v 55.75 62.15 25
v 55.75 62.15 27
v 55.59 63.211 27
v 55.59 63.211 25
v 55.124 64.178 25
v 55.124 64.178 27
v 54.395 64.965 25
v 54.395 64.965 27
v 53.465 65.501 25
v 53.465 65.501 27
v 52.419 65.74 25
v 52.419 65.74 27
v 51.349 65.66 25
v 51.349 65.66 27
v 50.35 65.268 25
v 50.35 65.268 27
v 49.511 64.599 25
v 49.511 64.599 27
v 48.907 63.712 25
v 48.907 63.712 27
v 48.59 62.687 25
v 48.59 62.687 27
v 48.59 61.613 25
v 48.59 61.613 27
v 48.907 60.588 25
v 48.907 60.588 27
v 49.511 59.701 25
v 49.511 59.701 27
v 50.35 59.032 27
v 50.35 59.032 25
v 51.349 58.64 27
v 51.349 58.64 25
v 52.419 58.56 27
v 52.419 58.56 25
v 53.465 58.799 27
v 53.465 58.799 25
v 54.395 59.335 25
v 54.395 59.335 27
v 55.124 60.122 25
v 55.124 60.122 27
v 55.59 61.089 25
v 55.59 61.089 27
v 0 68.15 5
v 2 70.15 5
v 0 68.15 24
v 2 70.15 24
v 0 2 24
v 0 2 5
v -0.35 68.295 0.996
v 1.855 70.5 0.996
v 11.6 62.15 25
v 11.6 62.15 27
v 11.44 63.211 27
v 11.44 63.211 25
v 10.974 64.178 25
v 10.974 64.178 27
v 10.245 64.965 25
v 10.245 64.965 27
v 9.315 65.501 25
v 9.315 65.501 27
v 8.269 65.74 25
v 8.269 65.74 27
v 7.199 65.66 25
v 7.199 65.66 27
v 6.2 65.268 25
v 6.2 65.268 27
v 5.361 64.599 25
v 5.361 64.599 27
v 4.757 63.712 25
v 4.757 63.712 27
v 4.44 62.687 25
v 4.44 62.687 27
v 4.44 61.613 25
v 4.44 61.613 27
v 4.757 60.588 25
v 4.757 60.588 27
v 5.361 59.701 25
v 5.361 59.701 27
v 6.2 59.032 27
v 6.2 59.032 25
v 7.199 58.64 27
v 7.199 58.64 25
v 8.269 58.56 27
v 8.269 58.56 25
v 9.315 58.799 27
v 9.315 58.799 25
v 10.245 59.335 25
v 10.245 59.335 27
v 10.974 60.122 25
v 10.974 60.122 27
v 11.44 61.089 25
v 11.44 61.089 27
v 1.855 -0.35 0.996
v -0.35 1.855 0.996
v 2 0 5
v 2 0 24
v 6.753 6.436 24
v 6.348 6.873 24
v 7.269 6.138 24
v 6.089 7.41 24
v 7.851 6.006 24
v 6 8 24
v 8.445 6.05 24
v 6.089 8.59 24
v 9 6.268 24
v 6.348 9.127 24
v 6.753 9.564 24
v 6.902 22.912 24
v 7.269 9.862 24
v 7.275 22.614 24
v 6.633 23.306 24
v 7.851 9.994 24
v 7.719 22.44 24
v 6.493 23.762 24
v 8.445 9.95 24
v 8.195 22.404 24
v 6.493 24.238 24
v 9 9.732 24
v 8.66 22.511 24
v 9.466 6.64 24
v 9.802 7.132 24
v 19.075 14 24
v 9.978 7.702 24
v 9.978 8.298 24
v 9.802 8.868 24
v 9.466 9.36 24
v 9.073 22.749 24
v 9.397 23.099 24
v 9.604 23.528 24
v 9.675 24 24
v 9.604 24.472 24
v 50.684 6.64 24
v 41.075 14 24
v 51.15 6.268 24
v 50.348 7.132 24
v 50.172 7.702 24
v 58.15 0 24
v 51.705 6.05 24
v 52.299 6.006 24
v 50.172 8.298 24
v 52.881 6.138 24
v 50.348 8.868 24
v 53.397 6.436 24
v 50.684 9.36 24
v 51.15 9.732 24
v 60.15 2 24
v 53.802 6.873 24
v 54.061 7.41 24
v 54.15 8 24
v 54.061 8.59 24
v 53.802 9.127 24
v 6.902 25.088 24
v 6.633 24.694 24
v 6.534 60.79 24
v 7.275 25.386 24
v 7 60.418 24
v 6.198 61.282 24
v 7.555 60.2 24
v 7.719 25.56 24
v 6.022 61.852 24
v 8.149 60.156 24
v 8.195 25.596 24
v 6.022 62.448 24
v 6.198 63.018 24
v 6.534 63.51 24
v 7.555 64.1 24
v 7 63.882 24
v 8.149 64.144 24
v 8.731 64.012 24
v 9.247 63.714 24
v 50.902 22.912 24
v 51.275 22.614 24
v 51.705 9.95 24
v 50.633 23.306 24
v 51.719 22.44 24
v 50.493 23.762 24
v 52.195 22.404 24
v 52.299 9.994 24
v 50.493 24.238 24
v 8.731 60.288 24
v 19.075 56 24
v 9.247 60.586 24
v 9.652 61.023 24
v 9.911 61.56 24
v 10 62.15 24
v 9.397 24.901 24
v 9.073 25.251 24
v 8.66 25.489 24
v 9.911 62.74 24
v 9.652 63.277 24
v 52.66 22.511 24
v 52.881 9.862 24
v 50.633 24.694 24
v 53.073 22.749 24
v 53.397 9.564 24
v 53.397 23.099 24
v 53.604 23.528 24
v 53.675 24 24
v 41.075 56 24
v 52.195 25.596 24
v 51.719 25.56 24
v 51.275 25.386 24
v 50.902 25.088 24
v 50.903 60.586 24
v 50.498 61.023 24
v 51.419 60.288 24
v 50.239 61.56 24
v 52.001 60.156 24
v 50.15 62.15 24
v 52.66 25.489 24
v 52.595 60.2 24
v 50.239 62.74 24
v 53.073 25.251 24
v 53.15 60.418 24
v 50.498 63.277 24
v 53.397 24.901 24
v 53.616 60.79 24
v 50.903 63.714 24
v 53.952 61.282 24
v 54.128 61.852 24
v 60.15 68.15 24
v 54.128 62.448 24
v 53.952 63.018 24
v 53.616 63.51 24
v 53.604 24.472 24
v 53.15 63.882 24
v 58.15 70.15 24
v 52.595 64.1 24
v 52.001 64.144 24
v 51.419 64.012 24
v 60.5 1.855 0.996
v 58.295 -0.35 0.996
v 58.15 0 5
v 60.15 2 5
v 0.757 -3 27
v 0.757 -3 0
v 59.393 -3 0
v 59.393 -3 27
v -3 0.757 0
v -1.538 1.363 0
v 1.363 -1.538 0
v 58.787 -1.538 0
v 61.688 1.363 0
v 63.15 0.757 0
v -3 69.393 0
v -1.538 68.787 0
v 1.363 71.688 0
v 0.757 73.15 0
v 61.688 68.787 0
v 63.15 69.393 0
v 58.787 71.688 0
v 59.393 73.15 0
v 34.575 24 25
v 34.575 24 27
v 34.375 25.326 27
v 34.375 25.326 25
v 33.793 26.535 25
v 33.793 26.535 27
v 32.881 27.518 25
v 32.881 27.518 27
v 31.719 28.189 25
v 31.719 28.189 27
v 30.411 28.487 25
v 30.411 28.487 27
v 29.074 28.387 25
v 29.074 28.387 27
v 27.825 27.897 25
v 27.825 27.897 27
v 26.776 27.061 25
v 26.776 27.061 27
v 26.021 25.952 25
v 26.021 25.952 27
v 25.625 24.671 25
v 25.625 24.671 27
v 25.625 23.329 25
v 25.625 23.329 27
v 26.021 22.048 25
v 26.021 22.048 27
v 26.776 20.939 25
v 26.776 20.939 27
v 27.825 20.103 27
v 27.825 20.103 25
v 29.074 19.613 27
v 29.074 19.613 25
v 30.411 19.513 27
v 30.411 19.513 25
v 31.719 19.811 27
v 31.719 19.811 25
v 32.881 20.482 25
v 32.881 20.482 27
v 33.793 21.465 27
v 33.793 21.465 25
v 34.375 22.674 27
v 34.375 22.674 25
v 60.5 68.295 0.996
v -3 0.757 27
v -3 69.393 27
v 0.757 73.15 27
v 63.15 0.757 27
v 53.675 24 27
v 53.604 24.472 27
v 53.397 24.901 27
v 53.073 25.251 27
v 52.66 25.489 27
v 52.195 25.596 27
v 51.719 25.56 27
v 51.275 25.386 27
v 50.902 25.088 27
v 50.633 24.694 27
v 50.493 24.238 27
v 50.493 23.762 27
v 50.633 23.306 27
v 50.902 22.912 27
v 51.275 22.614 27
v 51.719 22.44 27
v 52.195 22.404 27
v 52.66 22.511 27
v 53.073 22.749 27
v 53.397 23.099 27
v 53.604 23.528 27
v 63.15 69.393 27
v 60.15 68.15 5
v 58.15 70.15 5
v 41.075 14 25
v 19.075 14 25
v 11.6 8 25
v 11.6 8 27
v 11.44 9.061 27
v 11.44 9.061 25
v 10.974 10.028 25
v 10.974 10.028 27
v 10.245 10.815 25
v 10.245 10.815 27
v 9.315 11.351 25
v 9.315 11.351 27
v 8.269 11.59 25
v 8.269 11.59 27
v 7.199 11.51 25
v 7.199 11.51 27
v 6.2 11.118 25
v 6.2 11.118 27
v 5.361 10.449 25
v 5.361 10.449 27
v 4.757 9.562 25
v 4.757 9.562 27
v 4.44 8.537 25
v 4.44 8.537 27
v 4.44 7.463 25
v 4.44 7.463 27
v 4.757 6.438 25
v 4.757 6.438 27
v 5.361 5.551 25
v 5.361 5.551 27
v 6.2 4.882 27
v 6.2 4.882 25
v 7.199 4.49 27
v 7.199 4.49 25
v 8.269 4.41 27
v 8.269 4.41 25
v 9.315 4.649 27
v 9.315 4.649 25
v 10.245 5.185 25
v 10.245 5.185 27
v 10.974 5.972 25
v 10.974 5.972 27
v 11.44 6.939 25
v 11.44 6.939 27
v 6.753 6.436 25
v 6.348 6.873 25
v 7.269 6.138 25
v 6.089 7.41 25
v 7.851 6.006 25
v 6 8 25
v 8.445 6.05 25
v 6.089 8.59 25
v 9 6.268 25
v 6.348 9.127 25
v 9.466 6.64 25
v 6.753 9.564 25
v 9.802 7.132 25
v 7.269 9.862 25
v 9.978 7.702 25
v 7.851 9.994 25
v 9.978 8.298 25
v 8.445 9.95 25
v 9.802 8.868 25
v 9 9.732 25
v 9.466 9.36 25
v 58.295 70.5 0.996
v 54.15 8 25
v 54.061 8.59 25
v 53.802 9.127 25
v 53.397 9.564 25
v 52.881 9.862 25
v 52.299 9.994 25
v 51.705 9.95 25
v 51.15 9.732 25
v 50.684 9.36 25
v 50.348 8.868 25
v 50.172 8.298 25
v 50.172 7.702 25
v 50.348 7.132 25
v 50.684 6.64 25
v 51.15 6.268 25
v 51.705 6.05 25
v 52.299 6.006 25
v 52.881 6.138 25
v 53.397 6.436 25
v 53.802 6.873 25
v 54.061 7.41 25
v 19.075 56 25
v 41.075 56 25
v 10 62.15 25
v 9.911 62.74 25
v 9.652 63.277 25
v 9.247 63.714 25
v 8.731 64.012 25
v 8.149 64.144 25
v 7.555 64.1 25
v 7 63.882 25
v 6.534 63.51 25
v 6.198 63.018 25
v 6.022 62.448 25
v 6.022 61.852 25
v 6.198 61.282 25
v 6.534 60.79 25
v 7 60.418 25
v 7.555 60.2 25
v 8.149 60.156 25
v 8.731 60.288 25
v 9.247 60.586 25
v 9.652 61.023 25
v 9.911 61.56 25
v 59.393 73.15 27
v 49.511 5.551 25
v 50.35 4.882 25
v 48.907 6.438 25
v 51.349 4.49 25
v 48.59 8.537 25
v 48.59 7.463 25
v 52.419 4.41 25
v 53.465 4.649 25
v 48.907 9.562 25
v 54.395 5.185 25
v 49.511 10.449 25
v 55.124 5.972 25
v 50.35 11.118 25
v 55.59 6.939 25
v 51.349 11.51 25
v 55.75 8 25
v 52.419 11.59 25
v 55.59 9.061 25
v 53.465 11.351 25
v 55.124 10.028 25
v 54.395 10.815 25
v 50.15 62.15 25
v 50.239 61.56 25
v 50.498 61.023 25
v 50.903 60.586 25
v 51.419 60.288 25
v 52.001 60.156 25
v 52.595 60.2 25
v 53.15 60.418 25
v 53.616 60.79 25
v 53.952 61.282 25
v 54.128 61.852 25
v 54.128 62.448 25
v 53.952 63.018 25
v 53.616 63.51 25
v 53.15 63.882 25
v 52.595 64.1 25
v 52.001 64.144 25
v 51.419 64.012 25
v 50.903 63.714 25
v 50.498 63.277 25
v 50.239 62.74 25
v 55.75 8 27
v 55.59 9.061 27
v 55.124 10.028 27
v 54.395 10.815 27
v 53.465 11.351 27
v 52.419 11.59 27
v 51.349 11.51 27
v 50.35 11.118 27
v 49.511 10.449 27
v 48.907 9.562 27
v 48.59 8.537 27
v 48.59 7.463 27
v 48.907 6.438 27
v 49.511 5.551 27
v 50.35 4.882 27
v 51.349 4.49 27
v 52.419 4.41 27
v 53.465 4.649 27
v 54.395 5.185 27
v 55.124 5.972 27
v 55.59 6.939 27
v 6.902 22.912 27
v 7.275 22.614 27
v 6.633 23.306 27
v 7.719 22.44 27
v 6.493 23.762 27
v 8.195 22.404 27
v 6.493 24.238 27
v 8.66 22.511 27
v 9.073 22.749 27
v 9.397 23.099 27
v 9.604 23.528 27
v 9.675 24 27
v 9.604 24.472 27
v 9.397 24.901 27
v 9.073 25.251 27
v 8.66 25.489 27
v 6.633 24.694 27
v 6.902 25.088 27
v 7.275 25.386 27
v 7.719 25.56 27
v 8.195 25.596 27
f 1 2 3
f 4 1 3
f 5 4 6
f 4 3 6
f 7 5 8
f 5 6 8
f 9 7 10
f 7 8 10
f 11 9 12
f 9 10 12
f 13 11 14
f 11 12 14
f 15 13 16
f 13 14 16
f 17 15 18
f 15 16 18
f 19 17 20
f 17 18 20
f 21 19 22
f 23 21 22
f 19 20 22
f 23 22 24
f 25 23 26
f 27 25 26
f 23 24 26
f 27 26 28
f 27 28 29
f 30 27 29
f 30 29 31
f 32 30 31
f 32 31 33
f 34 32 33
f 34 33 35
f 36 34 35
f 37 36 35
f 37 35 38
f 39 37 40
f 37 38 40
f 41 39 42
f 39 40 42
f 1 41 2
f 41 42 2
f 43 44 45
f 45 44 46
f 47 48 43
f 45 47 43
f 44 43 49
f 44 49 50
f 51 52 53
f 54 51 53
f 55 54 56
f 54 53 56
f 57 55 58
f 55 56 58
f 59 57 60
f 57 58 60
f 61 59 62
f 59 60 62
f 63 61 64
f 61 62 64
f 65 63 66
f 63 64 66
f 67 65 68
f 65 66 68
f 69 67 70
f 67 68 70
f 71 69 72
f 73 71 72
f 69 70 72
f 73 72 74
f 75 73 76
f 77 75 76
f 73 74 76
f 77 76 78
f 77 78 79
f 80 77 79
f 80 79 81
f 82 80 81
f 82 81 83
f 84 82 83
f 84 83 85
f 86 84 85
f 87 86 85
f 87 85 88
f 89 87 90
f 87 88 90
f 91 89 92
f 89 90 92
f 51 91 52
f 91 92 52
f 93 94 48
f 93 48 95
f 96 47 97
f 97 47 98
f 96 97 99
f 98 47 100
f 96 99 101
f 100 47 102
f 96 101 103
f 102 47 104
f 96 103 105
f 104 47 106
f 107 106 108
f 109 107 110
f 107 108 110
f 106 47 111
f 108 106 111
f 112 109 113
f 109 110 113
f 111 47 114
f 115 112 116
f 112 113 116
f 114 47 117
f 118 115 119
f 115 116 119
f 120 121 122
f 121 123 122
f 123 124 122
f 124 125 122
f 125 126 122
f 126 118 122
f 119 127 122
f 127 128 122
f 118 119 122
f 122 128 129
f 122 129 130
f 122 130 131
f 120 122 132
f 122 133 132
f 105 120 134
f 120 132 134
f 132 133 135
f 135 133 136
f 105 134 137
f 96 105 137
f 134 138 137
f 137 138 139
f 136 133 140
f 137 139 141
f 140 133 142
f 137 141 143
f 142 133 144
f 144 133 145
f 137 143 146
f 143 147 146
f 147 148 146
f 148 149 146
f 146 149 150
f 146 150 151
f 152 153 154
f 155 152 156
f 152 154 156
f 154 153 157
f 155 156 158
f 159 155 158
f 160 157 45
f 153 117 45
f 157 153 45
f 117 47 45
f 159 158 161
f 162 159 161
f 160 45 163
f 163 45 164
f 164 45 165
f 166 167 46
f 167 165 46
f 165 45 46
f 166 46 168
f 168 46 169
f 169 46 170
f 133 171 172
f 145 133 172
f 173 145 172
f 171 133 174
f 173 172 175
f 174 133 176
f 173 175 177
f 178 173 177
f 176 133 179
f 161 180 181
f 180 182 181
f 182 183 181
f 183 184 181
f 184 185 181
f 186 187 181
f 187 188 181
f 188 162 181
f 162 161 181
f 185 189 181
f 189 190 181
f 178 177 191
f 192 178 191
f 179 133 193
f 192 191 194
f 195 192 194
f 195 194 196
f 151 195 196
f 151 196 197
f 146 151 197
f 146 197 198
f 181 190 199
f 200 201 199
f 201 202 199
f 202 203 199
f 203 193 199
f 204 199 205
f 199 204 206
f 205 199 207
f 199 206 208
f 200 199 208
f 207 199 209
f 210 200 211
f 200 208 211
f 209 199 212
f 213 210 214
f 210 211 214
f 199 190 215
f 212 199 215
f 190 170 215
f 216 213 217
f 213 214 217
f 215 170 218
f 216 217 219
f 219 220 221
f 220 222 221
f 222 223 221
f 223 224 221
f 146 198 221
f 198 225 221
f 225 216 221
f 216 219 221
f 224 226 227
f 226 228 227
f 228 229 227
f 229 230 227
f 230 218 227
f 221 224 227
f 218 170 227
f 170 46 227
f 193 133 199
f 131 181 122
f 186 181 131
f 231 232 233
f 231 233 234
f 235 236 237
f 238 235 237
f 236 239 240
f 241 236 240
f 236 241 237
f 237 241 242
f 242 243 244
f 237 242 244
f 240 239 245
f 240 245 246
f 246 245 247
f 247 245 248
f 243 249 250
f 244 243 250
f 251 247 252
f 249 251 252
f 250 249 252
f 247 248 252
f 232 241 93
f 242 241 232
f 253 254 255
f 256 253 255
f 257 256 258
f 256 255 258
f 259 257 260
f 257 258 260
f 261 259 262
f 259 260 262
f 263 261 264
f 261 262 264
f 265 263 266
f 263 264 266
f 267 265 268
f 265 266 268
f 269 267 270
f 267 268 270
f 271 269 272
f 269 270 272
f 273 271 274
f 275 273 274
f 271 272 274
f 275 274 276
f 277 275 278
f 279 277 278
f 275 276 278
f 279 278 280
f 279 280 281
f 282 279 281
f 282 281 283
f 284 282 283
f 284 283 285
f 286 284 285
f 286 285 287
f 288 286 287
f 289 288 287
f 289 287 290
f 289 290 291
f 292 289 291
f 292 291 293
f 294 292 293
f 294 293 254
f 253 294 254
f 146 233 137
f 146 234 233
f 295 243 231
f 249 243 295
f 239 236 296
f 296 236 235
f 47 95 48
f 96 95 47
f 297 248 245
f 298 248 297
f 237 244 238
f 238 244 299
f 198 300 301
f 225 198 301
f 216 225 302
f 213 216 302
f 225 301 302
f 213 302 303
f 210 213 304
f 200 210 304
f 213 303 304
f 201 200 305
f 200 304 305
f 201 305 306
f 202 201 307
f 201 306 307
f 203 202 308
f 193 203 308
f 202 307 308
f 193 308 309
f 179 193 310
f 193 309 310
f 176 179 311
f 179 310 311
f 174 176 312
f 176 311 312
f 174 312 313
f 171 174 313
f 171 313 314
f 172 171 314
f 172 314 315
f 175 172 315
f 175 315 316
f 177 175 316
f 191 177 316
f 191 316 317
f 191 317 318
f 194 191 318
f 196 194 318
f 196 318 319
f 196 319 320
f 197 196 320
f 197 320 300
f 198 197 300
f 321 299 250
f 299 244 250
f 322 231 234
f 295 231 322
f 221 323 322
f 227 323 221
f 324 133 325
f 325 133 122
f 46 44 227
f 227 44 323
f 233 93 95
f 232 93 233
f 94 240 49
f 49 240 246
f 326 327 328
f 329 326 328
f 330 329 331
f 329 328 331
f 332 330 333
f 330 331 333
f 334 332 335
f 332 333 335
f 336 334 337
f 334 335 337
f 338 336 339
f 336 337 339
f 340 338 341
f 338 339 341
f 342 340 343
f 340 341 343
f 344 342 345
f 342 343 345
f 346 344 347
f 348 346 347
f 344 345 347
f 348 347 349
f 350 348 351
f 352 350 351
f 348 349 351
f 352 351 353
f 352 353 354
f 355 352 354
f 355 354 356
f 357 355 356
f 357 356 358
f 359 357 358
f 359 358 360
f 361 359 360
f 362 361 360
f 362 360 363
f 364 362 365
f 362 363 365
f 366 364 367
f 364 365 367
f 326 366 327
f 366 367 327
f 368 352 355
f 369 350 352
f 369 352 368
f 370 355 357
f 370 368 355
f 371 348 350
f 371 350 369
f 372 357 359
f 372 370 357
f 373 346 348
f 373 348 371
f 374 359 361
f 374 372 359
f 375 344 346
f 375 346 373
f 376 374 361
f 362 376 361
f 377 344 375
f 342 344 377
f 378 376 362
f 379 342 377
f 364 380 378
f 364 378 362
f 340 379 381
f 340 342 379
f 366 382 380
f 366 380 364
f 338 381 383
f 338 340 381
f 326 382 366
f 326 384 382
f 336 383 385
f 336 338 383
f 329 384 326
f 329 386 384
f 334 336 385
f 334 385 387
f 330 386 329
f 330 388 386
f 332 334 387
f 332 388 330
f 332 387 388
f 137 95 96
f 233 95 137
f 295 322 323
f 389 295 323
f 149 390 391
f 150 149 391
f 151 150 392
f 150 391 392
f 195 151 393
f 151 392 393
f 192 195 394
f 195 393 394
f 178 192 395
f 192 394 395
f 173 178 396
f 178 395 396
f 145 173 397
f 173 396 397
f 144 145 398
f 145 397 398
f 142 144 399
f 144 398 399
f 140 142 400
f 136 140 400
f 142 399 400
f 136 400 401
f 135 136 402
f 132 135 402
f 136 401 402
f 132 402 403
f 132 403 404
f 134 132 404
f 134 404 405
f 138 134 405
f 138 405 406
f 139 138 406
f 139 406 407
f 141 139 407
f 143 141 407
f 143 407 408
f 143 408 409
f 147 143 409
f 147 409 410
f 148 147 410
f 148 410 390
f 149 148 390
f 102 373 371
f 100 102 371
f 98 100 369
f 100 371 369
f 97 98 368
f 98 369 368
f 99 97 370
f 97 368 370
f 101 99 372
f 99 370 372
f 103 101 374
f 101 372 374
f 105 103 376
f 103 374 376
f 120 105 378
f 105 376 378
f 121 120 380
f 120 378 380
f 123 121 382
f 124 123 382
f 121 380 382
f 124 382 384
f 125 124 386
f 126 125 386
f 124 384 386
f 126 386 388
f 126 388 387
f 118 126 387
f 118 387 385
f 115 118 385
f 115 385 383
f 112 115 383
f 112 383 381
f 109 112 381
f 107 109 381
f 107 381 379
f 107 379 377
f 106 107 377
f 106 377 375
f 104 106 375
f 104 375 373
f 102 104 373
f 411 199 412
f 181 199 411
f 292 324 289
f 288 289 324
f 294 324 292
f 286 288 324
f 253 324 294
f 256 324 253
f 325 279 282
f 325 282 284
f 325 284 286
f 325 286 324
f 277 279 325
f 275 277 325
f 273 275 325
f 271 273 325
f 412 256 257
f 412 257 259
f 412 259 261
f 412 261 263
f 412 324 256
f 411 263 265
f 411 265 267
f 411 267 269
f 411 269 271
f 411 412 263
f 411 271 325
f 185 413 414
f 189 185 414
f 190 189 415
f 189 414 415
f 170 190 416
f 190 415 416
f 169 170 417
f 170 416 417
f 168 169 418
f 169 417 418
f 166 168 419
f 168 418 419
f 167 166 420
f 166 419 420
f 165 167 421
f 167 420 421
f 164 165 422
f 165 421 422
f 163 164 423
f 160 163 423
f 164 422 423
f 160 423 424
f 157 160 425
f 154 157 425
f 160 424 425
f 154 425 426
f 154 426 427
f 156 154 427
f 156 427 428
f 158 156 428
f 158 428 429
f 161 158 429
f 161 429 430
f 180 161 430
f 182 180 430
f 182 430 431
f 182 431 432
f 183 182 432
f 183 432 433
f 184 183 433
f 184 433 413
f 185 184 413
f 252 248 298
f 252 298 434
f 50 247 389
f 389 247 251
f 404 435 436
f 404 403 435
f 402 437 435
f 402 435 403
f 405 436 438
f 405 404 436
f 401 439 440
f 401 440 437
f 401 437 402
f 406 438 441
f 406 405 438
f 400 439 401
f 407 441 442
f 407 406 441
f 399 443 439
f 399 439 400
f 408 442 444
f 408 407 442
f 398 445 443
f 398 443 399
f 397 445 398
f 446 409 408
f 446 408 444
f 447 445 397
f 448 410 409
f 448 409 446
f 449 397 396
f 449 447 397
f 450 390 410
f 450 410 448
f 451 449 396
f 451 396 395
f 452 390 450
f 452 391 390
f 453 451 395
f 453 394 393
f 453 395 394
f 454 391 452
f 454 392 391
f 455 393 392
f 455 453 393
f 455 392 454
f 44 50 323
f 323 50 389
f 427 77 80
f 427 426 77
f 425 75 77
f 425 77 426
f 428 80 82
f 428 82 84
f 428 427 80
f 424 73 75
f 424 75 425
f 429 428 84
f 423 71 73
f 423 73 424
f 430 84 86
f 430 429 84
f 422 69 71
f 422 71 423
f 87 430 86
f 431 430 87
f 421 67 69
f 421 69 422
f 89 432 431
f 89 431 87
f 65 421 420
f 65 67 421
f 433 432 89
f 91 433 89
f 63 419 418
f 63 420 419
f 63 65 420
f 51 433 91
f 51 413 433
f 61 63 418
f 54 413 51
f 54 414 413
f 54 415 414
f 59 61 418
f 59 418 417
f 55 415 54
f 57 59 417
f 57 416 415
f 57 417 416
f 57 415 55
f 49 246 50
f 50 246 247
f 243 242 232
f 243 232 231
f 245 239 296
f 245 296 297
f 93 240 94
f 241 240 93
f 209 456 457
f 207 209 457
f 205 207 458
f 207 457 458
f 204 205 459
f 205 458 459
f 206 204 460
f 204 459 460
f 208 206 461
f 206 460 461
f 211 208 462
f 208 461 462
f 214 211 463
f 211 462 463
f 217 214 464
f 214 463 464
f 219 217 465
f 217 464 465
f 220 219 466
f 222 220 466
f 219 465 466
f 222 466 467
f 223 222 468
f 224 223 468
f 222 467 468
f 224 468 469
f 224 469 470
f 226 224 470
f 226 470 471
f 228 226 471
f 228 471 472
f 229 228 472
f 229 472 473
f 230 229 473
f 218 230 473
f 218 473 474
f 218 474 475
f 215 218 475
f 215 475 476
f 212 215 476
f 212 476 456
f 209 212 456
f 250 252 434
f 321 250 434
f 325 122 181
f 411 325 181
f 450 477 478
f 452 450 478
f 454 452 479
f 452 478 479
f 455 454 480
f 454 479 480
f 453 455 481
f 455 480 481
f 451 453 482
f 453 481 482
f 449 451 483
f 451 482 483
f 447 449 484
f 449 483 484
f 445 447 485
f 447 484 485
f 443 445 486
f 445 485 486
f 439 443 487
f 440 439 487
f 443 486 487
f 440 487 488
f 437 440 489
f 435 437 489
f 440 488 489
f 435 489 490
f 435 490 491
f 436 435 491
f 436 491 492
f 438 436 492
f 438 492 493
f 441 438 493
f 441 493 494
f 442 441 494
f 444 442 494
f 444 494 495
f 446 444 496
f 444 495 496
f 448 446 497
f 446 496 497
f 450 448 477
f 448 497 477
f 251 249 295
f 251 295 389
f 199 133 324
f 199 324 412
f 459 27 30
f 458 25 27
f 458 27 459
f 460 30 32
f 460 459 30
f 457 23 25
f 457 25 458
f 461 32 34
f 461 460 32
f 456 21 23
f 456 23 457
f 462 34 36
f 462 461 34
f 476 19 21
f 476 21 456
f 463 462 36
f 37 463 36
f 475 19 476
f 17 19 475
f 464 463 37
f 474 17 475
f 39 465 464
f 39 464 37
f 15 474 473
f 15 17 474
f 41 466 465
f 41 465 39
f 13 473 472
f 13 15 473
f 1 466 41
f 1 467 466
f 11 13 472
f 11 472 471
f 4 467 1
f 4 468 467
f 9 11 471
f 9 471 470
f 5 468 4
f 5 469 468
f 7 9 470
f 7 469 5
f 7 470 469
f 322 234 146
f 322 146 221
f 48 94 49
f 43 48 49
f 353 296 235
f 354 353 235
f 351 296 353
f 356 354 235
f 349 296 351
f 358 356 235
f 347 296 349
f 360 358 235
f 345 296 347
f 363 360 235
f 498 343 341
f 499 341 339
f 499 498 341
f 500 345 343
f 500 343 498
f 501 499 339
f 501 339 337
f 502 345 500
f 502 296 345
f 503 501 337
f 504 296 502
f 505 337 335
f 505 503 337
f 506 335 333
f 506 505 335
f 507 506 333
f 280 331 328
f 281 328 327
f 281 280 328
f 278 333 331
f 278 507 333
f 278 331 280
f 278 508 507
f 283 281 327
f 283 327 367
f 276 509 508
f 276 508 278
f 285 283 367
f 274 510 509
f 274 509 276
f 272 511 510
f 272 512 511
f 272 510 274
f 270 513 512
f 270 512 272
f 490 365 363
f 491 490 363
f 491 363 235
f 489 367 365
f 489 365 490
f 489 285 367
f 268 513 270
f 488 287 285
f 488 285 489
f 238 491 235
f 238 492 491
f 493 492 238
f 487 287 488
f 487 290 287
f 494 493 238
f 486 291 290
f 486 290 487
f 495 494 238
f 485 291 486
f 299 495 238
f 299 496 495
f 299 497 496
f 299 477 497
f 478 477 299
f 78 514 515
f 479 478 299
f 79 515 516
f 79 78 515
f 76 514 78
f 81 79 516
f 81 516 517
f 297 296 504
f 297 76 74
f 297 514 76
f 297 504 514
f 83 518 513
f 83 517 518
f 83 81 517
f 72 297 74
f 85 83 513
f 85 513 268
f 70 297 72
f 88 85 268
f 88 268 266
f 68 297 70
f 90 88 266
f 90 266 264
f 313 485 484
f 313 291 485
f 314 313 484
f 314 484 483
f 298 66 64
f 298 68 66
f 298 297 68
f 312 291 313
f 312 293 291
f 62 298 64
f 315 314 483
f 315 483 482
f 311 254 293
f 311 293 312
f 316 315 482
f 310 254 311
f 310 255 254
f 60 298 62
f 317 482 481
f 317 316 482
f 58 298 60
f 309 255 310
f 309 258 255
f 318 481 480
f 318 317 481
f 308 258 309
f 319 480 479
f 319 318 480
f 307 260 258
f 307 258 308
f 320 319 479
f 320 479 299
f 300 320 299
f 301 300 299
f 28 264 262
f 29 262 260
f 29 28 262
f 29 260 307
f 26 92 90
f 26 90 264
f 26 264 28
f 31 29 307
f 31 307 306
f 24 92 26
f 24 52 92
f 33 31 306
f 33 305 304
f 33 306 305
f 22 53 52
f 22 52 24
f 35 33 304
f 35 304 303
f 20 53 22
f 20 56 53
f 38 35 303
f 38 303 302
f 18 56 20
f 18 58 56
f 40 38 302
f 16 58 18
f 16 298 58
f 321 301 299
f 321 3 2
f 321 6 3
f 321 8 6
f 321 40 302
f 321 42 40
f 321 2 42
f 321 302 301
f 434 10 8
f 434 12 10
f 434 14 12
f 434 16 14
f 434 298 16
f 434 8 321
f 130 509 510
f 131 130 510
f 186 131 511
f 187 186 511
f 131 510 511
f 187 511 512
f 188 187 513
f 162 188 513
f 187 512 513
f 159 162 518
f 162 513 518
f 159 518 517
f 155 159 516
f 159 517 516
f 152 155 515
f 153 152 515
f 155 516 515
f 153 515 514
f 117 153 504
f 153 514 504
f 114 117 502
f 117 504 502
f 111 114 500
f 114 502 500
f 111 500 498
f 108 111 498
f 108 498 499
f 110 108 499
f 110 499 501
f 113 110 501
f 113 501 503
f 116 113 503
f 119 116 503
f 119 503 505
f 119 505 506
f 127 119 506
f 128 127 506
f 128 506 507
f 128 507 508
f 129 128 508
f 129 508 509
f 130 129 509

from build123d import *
from OCP.BRepFilletAPI import BRepFilletAPI_MakeChamfer

# Parameters (mm, degrees)
SKIZZE1_W                       = 60.15
SKIZZE1_H                       = 70.15
GRUNDK_RPER_DEPTH               = 24
FASE1_SIZE                      = 2
WANDUNG1_T                      = 3
SKIZZE2_R                       = 4.5
DURCHBRUCH_SERVO_DEPTH          = 101.338651576
SKIZZE4_W                       = 22
SKIZZE4_H                       = 42
SERVOFREISCHNITT_DEPTH          = 1
SCHNITT_LINEAR_AUSTRAGEN2_REACH = 102.339
SKIZZE7_R                       = 2
SKIZZE8_R                       = 3.6
SCHNITT_LINEAR_AUSTRAGEN3_DEPTH = 2
SCHNITT_LINEAR_AUSTRAGEN5_REACH = 102.339
SKIZZE3_R                       = 1.6
FASE2_SIZE                      = 5
FASE2_SIZE2                     = 0.437443318
FASE3_SIZE                      = 1
FASE3_SIZE2                     = 1.100062868


with BuildPart() as part:
    # Skizze1 → Grundkörper (new body)
    with BuildSketch(Plane.XY):
        with Locations((30.075, 35.075)):
            Rectangle(SKIZZE1_W, SKIZZE1_H)
    extrude(amount=GRUNDK_RPER_DEPTH)

    # Fase1
    fase1_edges = [part.edges().sort_by_distance(p)[0] for p in [
        (0, 70.15, 12),
        (60.15, 70.15, 12),
        (60.15, 0, 12),
        (0, 0, 12),
    ]]
    chamfer(fase1_edges, length=FASE1_SIZE)

    # Wandung1
    wandung1_openings = [part.faces().sort_by_distance(p)[0] for p in [
        (30.075, 35.075, 0),
    ]]
    offset(amount=WANDUNG1_T, openings=wandung1_openings, kind=Kind.INTERSECTION)

    # Skizze2 → Durchbruch Servo (cut, through all)
    with BuildSketch(Plane.XY.offset(27)):
        with Locations((30.075, 24)):
            Circle(SKIZZE2_R)
    extrude(amount=-DURCHBRUCH_SERVO_DEPTH, mode=Mode.SUBTRACT)

    # Skizze4 → ServoFreischnitt (cut)
    with BuildSketch(Plane(origin=(0, 0, 24), x_dir=(-1, 0, 0), z_dir=(0, 0, -1))):
        with Locations((-30.075, 35)):
            Rectangle(SKIZZE4_W, SKIZZE4_H)
    extrude(amount=-SERVOFREISCHNITT_DEPTH, mode=Mode.SUBTRACT)

    # Skizze7 → Schnitt-Linear austragen2 (cut, up to next)
    with BuildSketch(Plane.XY.offset(27), mode=Mode.PRIVATE) as schnitt_linear_austragen2_sk1:
        with Locations((8, 62.15)):
            Circle(SKIZZE7_R)
    schnitt_linear_austragen2_tool1 = extrude(schnitt_linear_austragen2_sk1.sketch, amount=-SCHNITT_LINEAR_AUSTRAGEN2_REACH, mode=Mode.PRIVATE) & part.part
    # Skizze7 → Schnitt-Linear austragen2 (cut, up to next)
    with BuildSketch(Plane.XY.offset(27), mode=Mode.PRIVATE) as schnitt_linear_austragen2_sk2:
        with Locations(Location((52.15, 62.15, 0), (0, 0, 180))):
            Circle(SKIZZE7_R)
    schnitt_linear_austragen2_tool2 = extrude(schnitt_linear_austragen2_sk2.sketch, amount=-SCHNITT_LINEAR_AUSTRAGEN2_REACH, mode=Mode.PRIVATE) & part.part
    # Skizze7 → Schnitt-Linear austragen2 (cut, up to next)
    with BuildSketch(Plane.XY.offset(27), mode=Mode.PRIVATE) as schnitt_linear_austragen2_sk3:
        with Locations((52.15, 8)):
            Circle(SKIZZE7_R)
    schnitt_linear_austragen2_tool3 = extrude(schnitt_linear_austragen2_sk3.sketch, amount=-SCHNITT_LINEAR_AUSTRAGEN2_REACH, mode=Mode.PRIVATE) & part.part
    # Skizze7 → Schnitt-Linear austragen2 (cut, up to next)
    with BuildSketch(Plane.XY.offset(27), mode=Mode.PRIVATE) as schnitt_linear_austragen2_sk4:
        with Locations(Location((8, 8, 0), (0, 0, 180))):
            Circle(SKIZZE7_R)
    schnitt_linear_austragen2_tool4 = extrude(schnitt_linear_austragen2_sk4.sketch, amount=-SCHNITT_LINEAR_AUSTRAGEN2_REACH, mode=Mode.PRIVATE) & part.part
    add(schnitt_linear_austragen2_tool1.solids().sort_by_distance((8, 62.15, 27))[0], mode=Mode.SUBTRACT)
    add(schnitt_linear_austragen2_tool2.solids().sort_by_distance((52.15, 62.15, 27))[0], mode=Mode.SUBTRACT)
    add(schnitt_linear_austragen2_tool3.solids().sort_by_distance((52.15, 8, 27))[0], mode=Mode.SUBTRACT)
    add(schnitt_linear_austragen2_tool4.solids().sort_by_distance((8, 8, 27))[0], mode=Mode.SUBTRACT)

    # Skizze8 → Schnitt-Linear austragen3 (cut)
    with BuildSketch(Plane.XY.offset(27)):
        with Locations((8, 62.15)):
            Circle(SKIZZE8_R)
        with Locations((52.15, 62.15)):
            Circle(SKIZZE8_R)
        with Locations((52.15, 8)):
            Circle(SKIZZE8_R)
        with Locations((8, 8)):
            Circle(SKIZZE8_R)
    extrude(amount=-SCHNITT_LINEAR_AUSTRAGEN3_DEPTH, mode=Mode.SUBTRACT)

    # Skizze3 → Schnitt-Linear austragen5 (cut, up to next)
    with BuildSketch(Plane.XY.offset(27), mode=Mode.PRIVATE) as schnitt_linear_austragen5_sk1:
        with Locations((8.075, 24)):
            Circle(SKIZZE3_R)
    schnitt_linear_austragen5_tool1 = extrude(schnitt_linear_austragen5_sk1.sketch, amount=-SCHNITT_LINEAR_AUSTRAGEN5_REACH, mode=Mode.PRIVATE) & part.part
    # Skizze3 → Schnitt-Linear austragen5 (cut, up to next)
    with BuildSketch(Plane.XY.offset(27), mode=Mode.PRIVATE) as schnitt_linear_austragen5_sk2:
        with Locations((52.075, 24)):
            Circle(SKIZZE3_R)
    schnitt_linear_austragen5_tool2 = extrude(schnitt_linear_austragen5_sk2.sketch, amount=-SCHNITT_LINEAR_AUSTRAGEN5_REACH, mode=Mode.PRIVATE) & part.part
    add(schnitt_linear_austragen5_tool1.solids().sort_by_distance((8.075, 24, 27))[0], mode=Mode.SUBTRACT)
    add(schnitt_linear_austragen5_tool2.solids().sort_by_distance((52.075, 24, 27))[0], mode=Mode.SUBTRACT)

    # Fase2: one chamfer whose edges measure the first distance from different faces: ONE call of the kernel's chamfer builder (chamfer() names one face for all edges)
    fase2_edges_1 = [part.edges().sort_by_distance(p)[0] for p in [
        (0, 35.075, 0),
    ]]
    fase2_side_1 = [part.faces().sort_by_distance(p)[0] for p in [
        (0, 35.075, 12),
    ]]
    fase2_edges_2 = [part.edges().sort_by_distance(p)[0] for p in [
        (30.075, 0, 0),
    ]]
    fase2_side_2 = [part.faces().sort_by_distance(p)[0] for p in [
        (30.075, 0, 12),
    ]]
    fase2_edges_3 = [part.edges().sort_by_distance(p)[0] for p in [
        (60.15, 35.075, 0),
    ]]
    fase2_side_3 = [part.faces().sort_by_distance(p)[0] for p in [
        (60.15, 35.075, 12),
    ]]
    fase2_edges_4 = [part.edges().sort_by_distance(p)[0] for p in [
        (30.075, 70.15, 0),
    ]]
    fase2_side_4 = [part.faces().sort_by_distance(p)[0] for p in [
        (30.075, 70.15, 12),
    ]]
    fase2_edges_5 = [part.edges().sort_by_distance(p)[0] for p in [
        (59.15, 1, 0),
    ]]
    fase2_side_5 = [part.faces().sort_by_distance(p)[0] for p in [
        (59.15, 1, 12),
    ]]
    fase2_edges_6 = [part.edges().sort_by_distance(p)[0] for p in [
        (1, 1, 0),
    ]]
    fase2_side_6 = [part.faces().sort_by_distance(p)[0] for p in [
        (1, 1, 12),
    ]]
    fase2_edges_7 = [part.edges().sort_by_distance(p)[0] for p in [
        (1, 69.15, 0),
    ]]
    fase2_side_7 = [part.faces().sort_by_distance(p)[0] for p in [
        (1, 69.15, 12),
    ]]
    fase2_edges_8 = [part.edges().sort_by_distance(p)[0] for p in [
        (59.15, 69.15, 0),
    ]]
    fase2_side_8 = [part.faces().sort_by_distance(p)[0] for p in [
        (59.15, 69.15, 12),
    ]]
    fase2 = BRepFilletAPI_MakeChamfer(part.part.solid().wrapped)
    for e in fase2_edges_1:
        fase2.Add(FASE2_SIZE, FASE2_SIZE2, e.wrapped, fase2_side_1[0].wrapped)  # the first distance lies on this face
    for e in fase2_edges_2:
        fase2.Add(FASE2_SIZE, FASE2_SIZE2, e.wrapped, fase2_side_2[0].wrapped)  # the first distance lies on this face
    for e in fase2_edges_3:
        fase2.Add(FASE2_SIZE, FASE2_SIZE2, e.wrapped, fase2_side_3[0].wrapped)  # the first distance lies on this face
    for e in fase2_edges_4:
        fase2.Add(FASE2_SIZE, FASE2_SIZE2, e.wrapped, fase2_side_4[0].wrapped)  # the first distance lies on this face
    for e in fase2_edges_5:
        fase2.Add(FASE2_SIZE, FASE2_SIZE2, e.wrapped, fase2_side_5[0].wrapped)  # the first distance lies on this face
    for e in fase2_edges_6:
        fase2.Add(FASE2_SIZE, FASE2_SIZE2, e.wrapped, fase2_side_6[0].wrapped)  # the first distance lies on this face
    for e in fase2_edges_7:
        fase2.Add(FASE2_SIZE, FASE2_SIZE2, e.wrapped, fase2_side_7[0].wrapped)  # the first distance lies on this face
    for e in fase2_edges_8:
        fase2.Add(FASE2_SIZE, FASE2_SIZE2, e.wrapped, fase2_side_8[0].wrapped)  # the first distance lies on this face
    add(Compound.cast(fase2.Shape()), mode=Mode.REPLACE)

    # Fase3: one chamfer whose edges measure the first distance from different faces: ONE call of the kernel's chamfer builder (chamfer() names one face for all edges)
    fase3_edges_1 = [part.edges().sort_by_distance(p)[0] for p in [
        (60.587443318, 35.075, 0),
    ]]
    fase3_side_1 = [part.faces().sort_by_distance(p)[0] for p in [
        (60.368920817, 35.075, 2.497723608),
    ]]
    fase3_edges_2 = [part.edges().sort_by_distance(p)[0] for p in [
        (59.459319136, 69.459319136, 0),
    ]]
    fase3_side_2 = [part.faces().sort_by_distance(p)[0] for p in [
        (59.307763339, 69.307763339, 2.449828985),
    ]]
    fase3_edges_3 = [part.edges().sort_by_distance(p)[0] for p in [
        (30.075, 70.587443318, 0),
    ]]
    fase3_side_3 = [part.faces().sort_by_distance(p)[0] for p in [
        (30.075, 70.368956172, 2.4973195),
    ]]
    fase3_edges_4 = [part.edges().sort_by_distance(p)[0] for p in [
        (0.690680864, 69.459319136, 0),
    ]]
    fase3_side_4 = [part.faces().sort_by_distance(p)[0] for p in [
        (0.842236661, 69.307763339, 2.449828985),
    ]]
    fase3_edges_5 = [part.edges().sort_by_distance(p)[0] for p in [
        (-0.437443318, 35.075, 0),
    ]]
    fase3_side_5 = [part.faces().sort_by_distance(p)[0] for p in [
        (-0.218920817, 35.075, 2.497723608),
    ]]
    fase3_edges_6 = [part.edges().sort_by_distance(p)[0] for p in [
        (0.690680864, 0.690680864, 0),
    ]]
    fase3_side_6 = [part.faces().sort_by_distance(p)[0] for p in [
        (0.842236661, 0.842236661, 2.449828985),
    ]]
    fase3_edges_7 = [part.edges().sort_by_distance(p)[0] for p in [
        (30.075, -0.437443318, 0),
    ]]
    fase3_side_7 = [part.faces().sort_by_distance(p)[0] for p in [
        (30.075, -0.218956172, 2.4973195),
    ]]
    fase3_edges_8 = [part.edges().sort_by_distance(p)[0] for p in [
        (59.459319136, 0.690680864, 0),
    ]]
    fase3_side_8 = [part.faces().sort_by_distance(p)[0] for p in [
        (59.307763339, 0.842236661, 2.449828985),
    ]]
    fase3 = BRepFilletAPI_MakeChamfer(part.part.solid().wrapped)
    for e in fase3_edges_1:
        fase3.Add(FASE3_SIZE, FASE3_SIZE2, e.wrapped, fase3_side_1[0].wrapped)  # the first distance lies on this face
    for e in fase3_edges_2:
        fase3.Add(FASE3_SIZE, FASE3_SIZE2, e.wrapped, fase3_side_2[0].wrapped)  # the first distance lies on this face
    for e in fase3_edges_3:
        fase3.Add(FASE3_SIZE, FASE3_SIZE2, e.wrapped, fase3_side_3[0].wrapped)  # the first distance lies on this face
    for e in fase3_edges_4:
        fase3.Add(FASE3_SIZE, FASE3_SIZE2, e.wrapped, fase3_side_4[0].wrapped)  # the first distance lies on this face
    for e in fase3_edges_5:
        fase3.Add(FASE3_SIZE, FASE3_SIZE2, e.wrapped, fase3_side_5[0].wrapped)  # the first distance lies on this face
    for e in fase3_edges_6:
        fase3.Add(FASE3_SIZE, FASE3_SIZE2, e.wrapped, fase3_side_6[0].wrapped)  # the first distance lies on this face
    for e in fase3_edges_7:
        fase3.Add(FASE3_SIZE, FASE3_SIZE2, e.wrapped, fase3_side_7[0].wrapped)  # the first distance lies on this face
    for e in fase3_edges_8:
        fase3.Add(FASE3_SIZE, FASE3_SIZE2, e.wrapped, fase3_side_8[0].wrapped)  # the first distance lies on this face
    add(Compound.cast(fase3.Shape()), mode=Mode.REPLACE)


solid = part.part
